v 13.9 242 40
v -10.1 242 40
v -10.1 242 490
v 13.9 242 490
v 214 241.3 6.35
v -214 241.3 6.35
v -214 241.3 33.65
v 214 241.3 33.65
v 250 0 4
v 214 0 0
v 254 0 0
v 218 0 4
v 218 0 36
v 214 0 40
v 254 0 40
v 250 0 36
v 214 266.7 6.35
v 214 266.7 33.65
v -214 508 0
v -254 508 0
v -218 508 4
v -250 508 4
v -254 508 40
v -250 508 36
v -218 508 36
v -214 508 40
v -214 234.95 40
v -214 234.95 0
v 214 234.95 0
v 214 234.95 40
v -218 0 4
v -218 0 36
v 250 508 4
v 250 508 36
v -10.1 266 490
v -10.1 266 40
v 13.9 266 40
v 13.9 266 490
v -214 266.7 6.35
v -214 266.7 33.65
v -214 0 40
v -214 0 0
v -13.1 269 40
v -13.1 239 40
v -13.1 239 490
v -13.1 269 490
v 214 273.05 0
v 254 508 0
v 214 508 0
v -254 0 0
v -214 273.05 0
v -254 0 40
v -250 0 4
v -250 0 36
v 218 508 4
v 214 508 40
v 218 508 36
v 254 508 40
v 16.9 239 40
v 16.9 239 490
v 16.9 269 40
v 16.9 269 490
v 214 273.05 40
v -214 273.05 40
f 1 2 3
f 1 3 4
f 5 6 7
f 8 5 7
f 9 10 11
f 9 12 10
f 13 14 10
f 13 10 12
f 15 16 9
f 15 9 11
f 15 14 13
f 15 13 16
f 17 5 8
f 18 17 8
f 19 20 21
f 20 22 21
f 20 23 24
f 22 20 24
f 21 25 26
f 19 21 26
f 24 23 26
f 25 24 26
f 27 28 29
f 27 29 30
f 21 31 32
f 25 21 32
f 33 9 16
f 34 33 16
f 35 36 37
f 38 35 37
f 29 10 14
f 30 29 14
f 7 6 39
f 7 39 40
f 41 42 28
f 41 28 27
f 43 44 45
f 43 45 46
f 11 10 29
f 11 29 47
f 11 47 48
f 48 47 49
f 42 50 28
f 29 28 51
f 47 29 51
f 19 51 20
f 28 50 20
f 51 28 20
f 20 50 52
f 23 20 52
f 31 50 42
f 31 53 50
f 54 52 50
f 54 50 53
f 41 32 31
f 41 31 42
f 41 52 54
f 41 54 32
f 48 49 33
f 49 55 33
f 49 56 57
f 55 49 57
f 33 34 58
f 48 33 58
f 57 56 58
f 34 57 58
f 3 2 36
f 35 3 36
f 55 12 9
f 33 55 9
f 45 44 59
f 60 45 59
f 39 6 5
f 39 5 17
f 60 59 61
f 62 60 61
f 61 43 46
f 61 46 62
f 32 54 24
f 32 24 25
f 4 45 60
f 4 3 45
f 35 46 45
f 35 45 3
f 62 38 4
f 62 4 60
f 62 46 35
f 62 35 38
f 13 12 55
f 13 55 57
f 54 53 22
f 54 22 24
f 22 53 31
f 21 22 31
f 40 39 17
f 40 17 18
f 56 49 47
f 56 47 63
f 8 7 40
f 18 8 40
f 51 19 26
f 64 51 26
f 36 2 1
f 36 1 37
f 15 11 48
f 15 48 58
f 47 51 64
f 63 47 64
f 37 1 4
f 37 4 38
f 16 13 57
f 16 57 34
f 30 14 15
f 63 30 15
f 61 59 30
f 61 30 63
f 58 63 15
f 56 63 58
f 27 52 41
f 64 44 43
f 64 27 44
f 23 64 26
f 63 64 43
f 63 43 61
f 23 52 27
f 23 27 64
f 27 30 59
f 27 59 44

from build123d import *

# Parameters (mm, degrees)
F0_W     = 40
F0_H     = 40
F0_W_2   = 32
F0_H_2   = 32
F1_DEPTH = 508
F2_W     = 38.1
F2_H     = 40
F2_W_2   = 25.4
F2_H_2   = 27.3
F3_DEPTH = 431.8
F4_W     = 30
F4_H     = 30
F4_W_2   = 24
F4_H_2   = 24
F5_DEPTH = 450


with BuildPart() as f1:
    # F0 (on Front) → F1 (new body)
    with BuildSketch(Plane.XZ):
        with Locations((-234, 20)):
            Rectangle(F0_W, F0_H)
        with Locations((-234, 20)):
            Rectangle(F0_W_2, F0_H_2, mode=Mode.SUBTRACT)
    extrude(amount=-F1_DEPTH)



with BuildPart() as f1b:
    # F0 (on Front) → F1, piece 2 (new body)
    with BuildSketch(Plane.XZ):
        with Locations((234, 20)):
            Rectangle(F0_W, F0_H)
        with Locations((234, 20)):
            Rectangle(F0_W_2, F0_H_2, mode=Mode.SUBTRACT)
    extrude(amount=-F1_DEPTH)


with BuildPart() as f1_1:
    add(f1.part)

    add(f1b.part)  # F3 merges F1b
    # F2 (on face) → F3 (join)
    with BuildSketch(Plane.YZ.offset(-214)):
        with Locations((254, 20)):
            Rectangle(F2_W, F2_H)
        with Locations((254, 20)):
            Rectangle(F2_W_2, F2_H_2, mode=Mode.SUBTRACT)
    extrude(amount=F3_DEPTH)

    # F4 (on face) → F5 (join)
    with BuildSketch(Plane.XY.offset(40)):
        with Locations((1.9, 254)):
            Rectangle(F4_W, F4_H)
        with Locations((1.9, 254)):
            Rectangle(F4_W_2, F4_H_2, mode=Mode.SUBTRACT)
    extrude(amount=F5_DEPTH)


solid = f1_1.part
